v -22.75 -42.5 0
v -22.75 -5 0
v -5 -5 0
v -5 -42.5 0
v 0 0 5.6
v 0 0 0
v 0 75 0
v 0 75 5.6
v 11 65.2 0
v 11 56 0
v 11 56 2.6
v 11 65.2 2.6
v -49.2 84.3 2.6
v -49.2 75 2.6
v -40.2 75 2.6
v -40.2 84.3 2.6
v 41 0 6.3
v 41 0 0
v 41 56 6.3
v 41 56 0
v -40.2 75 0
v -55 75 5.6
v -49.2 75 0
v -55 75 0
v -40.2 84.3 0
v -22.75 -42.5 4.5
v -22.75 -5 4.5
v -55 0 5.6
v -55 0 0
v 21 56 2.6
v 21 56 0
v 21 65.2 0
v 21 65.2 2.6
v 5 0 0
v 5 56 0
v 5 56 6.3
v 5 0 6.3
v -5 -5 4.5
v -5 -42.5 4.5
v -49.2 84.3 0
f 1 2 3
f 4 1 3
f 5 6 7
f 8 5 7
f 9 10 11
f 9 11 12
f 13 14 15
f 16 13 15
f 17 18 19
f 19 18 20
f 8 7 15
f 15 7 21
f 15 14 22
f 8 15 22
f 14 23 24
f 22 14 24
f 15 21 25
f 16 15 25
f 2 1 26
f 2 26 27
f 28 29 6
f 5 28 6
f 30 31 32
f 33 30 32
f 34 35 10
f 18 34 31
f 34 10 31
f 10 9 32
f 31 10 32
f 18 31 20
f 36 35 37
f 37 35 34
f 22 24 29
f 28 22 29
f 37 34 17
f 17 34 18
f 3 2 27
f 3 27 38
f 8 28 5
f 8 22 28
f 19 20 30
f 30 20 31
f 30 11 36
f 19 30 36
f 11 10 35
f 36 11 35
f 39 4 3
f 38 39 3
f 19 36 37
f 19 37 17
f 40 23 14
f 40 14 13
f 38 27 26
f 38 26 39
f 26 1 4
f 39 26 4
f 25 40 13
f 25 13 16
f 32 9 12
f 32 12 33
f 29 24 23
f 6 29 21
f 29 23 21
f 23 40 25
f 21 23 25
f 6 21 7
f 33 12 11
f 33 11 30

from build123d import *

# Parameters (mm, degrees)
F1_DEPTH = 5.6
F0_W     = 9
F0_H     = 9.3
F2_DEPTH = 2.6
F4_DEPTH = 6.3
F3_W     = 10
F3_H     = 9.2
F5_DEPTH = 2.6
F6_W     = 17.75
F6_H     = 37.5
F7_DEPTH = 4.5


with BuildPart() as f1:
    # F0 (on Top) → F1 (new body)
    with BuildSketch(Plane.XY):
        Polygon((-55, 0), (0, 0), (0, 75), (-40.2, 75), (-49.2, 75), (-55, 75), align=None)
    extrude(amount=F1_DEPTH)

    # F0 (on Top) → F2 (join)
    with BuildSketch(Plane.XY):
        with Locations((-44.7, 79.65)):
            Rectangle(F0_W, F0_H)
    extrude(amount=F2_DEPTH)


with BuildPart() as f4:
    # F3 (on Top) → F4 (new body)
    with BuildSketch(Plane.XY):
        Polygon((5, 56), (5, 0), (41, 0), (41, 56), (21, 56), (11, 56), align=None)
    extrude(amount=F4_DEPTH)

    # F3 (on Top) → F5 (join)
    with BuildSketch(Plane.XY):
        with Locations((16, 60.6)):
            Rectangle(F3_W, F3_H)
    extrude(amount=F5_DEPTH)


with BuildPart() as f7:
    # F6 (on Top) → F7 (new body)
    with BuildSketch(Plane.XY):
        with Locations((-13.875, -23.75)):
            Rectangle(F6_W, F6_H)
    extrude(amount=F7_DEPTH)


solid = Compound([f1.part, f4.part, f7.part])
